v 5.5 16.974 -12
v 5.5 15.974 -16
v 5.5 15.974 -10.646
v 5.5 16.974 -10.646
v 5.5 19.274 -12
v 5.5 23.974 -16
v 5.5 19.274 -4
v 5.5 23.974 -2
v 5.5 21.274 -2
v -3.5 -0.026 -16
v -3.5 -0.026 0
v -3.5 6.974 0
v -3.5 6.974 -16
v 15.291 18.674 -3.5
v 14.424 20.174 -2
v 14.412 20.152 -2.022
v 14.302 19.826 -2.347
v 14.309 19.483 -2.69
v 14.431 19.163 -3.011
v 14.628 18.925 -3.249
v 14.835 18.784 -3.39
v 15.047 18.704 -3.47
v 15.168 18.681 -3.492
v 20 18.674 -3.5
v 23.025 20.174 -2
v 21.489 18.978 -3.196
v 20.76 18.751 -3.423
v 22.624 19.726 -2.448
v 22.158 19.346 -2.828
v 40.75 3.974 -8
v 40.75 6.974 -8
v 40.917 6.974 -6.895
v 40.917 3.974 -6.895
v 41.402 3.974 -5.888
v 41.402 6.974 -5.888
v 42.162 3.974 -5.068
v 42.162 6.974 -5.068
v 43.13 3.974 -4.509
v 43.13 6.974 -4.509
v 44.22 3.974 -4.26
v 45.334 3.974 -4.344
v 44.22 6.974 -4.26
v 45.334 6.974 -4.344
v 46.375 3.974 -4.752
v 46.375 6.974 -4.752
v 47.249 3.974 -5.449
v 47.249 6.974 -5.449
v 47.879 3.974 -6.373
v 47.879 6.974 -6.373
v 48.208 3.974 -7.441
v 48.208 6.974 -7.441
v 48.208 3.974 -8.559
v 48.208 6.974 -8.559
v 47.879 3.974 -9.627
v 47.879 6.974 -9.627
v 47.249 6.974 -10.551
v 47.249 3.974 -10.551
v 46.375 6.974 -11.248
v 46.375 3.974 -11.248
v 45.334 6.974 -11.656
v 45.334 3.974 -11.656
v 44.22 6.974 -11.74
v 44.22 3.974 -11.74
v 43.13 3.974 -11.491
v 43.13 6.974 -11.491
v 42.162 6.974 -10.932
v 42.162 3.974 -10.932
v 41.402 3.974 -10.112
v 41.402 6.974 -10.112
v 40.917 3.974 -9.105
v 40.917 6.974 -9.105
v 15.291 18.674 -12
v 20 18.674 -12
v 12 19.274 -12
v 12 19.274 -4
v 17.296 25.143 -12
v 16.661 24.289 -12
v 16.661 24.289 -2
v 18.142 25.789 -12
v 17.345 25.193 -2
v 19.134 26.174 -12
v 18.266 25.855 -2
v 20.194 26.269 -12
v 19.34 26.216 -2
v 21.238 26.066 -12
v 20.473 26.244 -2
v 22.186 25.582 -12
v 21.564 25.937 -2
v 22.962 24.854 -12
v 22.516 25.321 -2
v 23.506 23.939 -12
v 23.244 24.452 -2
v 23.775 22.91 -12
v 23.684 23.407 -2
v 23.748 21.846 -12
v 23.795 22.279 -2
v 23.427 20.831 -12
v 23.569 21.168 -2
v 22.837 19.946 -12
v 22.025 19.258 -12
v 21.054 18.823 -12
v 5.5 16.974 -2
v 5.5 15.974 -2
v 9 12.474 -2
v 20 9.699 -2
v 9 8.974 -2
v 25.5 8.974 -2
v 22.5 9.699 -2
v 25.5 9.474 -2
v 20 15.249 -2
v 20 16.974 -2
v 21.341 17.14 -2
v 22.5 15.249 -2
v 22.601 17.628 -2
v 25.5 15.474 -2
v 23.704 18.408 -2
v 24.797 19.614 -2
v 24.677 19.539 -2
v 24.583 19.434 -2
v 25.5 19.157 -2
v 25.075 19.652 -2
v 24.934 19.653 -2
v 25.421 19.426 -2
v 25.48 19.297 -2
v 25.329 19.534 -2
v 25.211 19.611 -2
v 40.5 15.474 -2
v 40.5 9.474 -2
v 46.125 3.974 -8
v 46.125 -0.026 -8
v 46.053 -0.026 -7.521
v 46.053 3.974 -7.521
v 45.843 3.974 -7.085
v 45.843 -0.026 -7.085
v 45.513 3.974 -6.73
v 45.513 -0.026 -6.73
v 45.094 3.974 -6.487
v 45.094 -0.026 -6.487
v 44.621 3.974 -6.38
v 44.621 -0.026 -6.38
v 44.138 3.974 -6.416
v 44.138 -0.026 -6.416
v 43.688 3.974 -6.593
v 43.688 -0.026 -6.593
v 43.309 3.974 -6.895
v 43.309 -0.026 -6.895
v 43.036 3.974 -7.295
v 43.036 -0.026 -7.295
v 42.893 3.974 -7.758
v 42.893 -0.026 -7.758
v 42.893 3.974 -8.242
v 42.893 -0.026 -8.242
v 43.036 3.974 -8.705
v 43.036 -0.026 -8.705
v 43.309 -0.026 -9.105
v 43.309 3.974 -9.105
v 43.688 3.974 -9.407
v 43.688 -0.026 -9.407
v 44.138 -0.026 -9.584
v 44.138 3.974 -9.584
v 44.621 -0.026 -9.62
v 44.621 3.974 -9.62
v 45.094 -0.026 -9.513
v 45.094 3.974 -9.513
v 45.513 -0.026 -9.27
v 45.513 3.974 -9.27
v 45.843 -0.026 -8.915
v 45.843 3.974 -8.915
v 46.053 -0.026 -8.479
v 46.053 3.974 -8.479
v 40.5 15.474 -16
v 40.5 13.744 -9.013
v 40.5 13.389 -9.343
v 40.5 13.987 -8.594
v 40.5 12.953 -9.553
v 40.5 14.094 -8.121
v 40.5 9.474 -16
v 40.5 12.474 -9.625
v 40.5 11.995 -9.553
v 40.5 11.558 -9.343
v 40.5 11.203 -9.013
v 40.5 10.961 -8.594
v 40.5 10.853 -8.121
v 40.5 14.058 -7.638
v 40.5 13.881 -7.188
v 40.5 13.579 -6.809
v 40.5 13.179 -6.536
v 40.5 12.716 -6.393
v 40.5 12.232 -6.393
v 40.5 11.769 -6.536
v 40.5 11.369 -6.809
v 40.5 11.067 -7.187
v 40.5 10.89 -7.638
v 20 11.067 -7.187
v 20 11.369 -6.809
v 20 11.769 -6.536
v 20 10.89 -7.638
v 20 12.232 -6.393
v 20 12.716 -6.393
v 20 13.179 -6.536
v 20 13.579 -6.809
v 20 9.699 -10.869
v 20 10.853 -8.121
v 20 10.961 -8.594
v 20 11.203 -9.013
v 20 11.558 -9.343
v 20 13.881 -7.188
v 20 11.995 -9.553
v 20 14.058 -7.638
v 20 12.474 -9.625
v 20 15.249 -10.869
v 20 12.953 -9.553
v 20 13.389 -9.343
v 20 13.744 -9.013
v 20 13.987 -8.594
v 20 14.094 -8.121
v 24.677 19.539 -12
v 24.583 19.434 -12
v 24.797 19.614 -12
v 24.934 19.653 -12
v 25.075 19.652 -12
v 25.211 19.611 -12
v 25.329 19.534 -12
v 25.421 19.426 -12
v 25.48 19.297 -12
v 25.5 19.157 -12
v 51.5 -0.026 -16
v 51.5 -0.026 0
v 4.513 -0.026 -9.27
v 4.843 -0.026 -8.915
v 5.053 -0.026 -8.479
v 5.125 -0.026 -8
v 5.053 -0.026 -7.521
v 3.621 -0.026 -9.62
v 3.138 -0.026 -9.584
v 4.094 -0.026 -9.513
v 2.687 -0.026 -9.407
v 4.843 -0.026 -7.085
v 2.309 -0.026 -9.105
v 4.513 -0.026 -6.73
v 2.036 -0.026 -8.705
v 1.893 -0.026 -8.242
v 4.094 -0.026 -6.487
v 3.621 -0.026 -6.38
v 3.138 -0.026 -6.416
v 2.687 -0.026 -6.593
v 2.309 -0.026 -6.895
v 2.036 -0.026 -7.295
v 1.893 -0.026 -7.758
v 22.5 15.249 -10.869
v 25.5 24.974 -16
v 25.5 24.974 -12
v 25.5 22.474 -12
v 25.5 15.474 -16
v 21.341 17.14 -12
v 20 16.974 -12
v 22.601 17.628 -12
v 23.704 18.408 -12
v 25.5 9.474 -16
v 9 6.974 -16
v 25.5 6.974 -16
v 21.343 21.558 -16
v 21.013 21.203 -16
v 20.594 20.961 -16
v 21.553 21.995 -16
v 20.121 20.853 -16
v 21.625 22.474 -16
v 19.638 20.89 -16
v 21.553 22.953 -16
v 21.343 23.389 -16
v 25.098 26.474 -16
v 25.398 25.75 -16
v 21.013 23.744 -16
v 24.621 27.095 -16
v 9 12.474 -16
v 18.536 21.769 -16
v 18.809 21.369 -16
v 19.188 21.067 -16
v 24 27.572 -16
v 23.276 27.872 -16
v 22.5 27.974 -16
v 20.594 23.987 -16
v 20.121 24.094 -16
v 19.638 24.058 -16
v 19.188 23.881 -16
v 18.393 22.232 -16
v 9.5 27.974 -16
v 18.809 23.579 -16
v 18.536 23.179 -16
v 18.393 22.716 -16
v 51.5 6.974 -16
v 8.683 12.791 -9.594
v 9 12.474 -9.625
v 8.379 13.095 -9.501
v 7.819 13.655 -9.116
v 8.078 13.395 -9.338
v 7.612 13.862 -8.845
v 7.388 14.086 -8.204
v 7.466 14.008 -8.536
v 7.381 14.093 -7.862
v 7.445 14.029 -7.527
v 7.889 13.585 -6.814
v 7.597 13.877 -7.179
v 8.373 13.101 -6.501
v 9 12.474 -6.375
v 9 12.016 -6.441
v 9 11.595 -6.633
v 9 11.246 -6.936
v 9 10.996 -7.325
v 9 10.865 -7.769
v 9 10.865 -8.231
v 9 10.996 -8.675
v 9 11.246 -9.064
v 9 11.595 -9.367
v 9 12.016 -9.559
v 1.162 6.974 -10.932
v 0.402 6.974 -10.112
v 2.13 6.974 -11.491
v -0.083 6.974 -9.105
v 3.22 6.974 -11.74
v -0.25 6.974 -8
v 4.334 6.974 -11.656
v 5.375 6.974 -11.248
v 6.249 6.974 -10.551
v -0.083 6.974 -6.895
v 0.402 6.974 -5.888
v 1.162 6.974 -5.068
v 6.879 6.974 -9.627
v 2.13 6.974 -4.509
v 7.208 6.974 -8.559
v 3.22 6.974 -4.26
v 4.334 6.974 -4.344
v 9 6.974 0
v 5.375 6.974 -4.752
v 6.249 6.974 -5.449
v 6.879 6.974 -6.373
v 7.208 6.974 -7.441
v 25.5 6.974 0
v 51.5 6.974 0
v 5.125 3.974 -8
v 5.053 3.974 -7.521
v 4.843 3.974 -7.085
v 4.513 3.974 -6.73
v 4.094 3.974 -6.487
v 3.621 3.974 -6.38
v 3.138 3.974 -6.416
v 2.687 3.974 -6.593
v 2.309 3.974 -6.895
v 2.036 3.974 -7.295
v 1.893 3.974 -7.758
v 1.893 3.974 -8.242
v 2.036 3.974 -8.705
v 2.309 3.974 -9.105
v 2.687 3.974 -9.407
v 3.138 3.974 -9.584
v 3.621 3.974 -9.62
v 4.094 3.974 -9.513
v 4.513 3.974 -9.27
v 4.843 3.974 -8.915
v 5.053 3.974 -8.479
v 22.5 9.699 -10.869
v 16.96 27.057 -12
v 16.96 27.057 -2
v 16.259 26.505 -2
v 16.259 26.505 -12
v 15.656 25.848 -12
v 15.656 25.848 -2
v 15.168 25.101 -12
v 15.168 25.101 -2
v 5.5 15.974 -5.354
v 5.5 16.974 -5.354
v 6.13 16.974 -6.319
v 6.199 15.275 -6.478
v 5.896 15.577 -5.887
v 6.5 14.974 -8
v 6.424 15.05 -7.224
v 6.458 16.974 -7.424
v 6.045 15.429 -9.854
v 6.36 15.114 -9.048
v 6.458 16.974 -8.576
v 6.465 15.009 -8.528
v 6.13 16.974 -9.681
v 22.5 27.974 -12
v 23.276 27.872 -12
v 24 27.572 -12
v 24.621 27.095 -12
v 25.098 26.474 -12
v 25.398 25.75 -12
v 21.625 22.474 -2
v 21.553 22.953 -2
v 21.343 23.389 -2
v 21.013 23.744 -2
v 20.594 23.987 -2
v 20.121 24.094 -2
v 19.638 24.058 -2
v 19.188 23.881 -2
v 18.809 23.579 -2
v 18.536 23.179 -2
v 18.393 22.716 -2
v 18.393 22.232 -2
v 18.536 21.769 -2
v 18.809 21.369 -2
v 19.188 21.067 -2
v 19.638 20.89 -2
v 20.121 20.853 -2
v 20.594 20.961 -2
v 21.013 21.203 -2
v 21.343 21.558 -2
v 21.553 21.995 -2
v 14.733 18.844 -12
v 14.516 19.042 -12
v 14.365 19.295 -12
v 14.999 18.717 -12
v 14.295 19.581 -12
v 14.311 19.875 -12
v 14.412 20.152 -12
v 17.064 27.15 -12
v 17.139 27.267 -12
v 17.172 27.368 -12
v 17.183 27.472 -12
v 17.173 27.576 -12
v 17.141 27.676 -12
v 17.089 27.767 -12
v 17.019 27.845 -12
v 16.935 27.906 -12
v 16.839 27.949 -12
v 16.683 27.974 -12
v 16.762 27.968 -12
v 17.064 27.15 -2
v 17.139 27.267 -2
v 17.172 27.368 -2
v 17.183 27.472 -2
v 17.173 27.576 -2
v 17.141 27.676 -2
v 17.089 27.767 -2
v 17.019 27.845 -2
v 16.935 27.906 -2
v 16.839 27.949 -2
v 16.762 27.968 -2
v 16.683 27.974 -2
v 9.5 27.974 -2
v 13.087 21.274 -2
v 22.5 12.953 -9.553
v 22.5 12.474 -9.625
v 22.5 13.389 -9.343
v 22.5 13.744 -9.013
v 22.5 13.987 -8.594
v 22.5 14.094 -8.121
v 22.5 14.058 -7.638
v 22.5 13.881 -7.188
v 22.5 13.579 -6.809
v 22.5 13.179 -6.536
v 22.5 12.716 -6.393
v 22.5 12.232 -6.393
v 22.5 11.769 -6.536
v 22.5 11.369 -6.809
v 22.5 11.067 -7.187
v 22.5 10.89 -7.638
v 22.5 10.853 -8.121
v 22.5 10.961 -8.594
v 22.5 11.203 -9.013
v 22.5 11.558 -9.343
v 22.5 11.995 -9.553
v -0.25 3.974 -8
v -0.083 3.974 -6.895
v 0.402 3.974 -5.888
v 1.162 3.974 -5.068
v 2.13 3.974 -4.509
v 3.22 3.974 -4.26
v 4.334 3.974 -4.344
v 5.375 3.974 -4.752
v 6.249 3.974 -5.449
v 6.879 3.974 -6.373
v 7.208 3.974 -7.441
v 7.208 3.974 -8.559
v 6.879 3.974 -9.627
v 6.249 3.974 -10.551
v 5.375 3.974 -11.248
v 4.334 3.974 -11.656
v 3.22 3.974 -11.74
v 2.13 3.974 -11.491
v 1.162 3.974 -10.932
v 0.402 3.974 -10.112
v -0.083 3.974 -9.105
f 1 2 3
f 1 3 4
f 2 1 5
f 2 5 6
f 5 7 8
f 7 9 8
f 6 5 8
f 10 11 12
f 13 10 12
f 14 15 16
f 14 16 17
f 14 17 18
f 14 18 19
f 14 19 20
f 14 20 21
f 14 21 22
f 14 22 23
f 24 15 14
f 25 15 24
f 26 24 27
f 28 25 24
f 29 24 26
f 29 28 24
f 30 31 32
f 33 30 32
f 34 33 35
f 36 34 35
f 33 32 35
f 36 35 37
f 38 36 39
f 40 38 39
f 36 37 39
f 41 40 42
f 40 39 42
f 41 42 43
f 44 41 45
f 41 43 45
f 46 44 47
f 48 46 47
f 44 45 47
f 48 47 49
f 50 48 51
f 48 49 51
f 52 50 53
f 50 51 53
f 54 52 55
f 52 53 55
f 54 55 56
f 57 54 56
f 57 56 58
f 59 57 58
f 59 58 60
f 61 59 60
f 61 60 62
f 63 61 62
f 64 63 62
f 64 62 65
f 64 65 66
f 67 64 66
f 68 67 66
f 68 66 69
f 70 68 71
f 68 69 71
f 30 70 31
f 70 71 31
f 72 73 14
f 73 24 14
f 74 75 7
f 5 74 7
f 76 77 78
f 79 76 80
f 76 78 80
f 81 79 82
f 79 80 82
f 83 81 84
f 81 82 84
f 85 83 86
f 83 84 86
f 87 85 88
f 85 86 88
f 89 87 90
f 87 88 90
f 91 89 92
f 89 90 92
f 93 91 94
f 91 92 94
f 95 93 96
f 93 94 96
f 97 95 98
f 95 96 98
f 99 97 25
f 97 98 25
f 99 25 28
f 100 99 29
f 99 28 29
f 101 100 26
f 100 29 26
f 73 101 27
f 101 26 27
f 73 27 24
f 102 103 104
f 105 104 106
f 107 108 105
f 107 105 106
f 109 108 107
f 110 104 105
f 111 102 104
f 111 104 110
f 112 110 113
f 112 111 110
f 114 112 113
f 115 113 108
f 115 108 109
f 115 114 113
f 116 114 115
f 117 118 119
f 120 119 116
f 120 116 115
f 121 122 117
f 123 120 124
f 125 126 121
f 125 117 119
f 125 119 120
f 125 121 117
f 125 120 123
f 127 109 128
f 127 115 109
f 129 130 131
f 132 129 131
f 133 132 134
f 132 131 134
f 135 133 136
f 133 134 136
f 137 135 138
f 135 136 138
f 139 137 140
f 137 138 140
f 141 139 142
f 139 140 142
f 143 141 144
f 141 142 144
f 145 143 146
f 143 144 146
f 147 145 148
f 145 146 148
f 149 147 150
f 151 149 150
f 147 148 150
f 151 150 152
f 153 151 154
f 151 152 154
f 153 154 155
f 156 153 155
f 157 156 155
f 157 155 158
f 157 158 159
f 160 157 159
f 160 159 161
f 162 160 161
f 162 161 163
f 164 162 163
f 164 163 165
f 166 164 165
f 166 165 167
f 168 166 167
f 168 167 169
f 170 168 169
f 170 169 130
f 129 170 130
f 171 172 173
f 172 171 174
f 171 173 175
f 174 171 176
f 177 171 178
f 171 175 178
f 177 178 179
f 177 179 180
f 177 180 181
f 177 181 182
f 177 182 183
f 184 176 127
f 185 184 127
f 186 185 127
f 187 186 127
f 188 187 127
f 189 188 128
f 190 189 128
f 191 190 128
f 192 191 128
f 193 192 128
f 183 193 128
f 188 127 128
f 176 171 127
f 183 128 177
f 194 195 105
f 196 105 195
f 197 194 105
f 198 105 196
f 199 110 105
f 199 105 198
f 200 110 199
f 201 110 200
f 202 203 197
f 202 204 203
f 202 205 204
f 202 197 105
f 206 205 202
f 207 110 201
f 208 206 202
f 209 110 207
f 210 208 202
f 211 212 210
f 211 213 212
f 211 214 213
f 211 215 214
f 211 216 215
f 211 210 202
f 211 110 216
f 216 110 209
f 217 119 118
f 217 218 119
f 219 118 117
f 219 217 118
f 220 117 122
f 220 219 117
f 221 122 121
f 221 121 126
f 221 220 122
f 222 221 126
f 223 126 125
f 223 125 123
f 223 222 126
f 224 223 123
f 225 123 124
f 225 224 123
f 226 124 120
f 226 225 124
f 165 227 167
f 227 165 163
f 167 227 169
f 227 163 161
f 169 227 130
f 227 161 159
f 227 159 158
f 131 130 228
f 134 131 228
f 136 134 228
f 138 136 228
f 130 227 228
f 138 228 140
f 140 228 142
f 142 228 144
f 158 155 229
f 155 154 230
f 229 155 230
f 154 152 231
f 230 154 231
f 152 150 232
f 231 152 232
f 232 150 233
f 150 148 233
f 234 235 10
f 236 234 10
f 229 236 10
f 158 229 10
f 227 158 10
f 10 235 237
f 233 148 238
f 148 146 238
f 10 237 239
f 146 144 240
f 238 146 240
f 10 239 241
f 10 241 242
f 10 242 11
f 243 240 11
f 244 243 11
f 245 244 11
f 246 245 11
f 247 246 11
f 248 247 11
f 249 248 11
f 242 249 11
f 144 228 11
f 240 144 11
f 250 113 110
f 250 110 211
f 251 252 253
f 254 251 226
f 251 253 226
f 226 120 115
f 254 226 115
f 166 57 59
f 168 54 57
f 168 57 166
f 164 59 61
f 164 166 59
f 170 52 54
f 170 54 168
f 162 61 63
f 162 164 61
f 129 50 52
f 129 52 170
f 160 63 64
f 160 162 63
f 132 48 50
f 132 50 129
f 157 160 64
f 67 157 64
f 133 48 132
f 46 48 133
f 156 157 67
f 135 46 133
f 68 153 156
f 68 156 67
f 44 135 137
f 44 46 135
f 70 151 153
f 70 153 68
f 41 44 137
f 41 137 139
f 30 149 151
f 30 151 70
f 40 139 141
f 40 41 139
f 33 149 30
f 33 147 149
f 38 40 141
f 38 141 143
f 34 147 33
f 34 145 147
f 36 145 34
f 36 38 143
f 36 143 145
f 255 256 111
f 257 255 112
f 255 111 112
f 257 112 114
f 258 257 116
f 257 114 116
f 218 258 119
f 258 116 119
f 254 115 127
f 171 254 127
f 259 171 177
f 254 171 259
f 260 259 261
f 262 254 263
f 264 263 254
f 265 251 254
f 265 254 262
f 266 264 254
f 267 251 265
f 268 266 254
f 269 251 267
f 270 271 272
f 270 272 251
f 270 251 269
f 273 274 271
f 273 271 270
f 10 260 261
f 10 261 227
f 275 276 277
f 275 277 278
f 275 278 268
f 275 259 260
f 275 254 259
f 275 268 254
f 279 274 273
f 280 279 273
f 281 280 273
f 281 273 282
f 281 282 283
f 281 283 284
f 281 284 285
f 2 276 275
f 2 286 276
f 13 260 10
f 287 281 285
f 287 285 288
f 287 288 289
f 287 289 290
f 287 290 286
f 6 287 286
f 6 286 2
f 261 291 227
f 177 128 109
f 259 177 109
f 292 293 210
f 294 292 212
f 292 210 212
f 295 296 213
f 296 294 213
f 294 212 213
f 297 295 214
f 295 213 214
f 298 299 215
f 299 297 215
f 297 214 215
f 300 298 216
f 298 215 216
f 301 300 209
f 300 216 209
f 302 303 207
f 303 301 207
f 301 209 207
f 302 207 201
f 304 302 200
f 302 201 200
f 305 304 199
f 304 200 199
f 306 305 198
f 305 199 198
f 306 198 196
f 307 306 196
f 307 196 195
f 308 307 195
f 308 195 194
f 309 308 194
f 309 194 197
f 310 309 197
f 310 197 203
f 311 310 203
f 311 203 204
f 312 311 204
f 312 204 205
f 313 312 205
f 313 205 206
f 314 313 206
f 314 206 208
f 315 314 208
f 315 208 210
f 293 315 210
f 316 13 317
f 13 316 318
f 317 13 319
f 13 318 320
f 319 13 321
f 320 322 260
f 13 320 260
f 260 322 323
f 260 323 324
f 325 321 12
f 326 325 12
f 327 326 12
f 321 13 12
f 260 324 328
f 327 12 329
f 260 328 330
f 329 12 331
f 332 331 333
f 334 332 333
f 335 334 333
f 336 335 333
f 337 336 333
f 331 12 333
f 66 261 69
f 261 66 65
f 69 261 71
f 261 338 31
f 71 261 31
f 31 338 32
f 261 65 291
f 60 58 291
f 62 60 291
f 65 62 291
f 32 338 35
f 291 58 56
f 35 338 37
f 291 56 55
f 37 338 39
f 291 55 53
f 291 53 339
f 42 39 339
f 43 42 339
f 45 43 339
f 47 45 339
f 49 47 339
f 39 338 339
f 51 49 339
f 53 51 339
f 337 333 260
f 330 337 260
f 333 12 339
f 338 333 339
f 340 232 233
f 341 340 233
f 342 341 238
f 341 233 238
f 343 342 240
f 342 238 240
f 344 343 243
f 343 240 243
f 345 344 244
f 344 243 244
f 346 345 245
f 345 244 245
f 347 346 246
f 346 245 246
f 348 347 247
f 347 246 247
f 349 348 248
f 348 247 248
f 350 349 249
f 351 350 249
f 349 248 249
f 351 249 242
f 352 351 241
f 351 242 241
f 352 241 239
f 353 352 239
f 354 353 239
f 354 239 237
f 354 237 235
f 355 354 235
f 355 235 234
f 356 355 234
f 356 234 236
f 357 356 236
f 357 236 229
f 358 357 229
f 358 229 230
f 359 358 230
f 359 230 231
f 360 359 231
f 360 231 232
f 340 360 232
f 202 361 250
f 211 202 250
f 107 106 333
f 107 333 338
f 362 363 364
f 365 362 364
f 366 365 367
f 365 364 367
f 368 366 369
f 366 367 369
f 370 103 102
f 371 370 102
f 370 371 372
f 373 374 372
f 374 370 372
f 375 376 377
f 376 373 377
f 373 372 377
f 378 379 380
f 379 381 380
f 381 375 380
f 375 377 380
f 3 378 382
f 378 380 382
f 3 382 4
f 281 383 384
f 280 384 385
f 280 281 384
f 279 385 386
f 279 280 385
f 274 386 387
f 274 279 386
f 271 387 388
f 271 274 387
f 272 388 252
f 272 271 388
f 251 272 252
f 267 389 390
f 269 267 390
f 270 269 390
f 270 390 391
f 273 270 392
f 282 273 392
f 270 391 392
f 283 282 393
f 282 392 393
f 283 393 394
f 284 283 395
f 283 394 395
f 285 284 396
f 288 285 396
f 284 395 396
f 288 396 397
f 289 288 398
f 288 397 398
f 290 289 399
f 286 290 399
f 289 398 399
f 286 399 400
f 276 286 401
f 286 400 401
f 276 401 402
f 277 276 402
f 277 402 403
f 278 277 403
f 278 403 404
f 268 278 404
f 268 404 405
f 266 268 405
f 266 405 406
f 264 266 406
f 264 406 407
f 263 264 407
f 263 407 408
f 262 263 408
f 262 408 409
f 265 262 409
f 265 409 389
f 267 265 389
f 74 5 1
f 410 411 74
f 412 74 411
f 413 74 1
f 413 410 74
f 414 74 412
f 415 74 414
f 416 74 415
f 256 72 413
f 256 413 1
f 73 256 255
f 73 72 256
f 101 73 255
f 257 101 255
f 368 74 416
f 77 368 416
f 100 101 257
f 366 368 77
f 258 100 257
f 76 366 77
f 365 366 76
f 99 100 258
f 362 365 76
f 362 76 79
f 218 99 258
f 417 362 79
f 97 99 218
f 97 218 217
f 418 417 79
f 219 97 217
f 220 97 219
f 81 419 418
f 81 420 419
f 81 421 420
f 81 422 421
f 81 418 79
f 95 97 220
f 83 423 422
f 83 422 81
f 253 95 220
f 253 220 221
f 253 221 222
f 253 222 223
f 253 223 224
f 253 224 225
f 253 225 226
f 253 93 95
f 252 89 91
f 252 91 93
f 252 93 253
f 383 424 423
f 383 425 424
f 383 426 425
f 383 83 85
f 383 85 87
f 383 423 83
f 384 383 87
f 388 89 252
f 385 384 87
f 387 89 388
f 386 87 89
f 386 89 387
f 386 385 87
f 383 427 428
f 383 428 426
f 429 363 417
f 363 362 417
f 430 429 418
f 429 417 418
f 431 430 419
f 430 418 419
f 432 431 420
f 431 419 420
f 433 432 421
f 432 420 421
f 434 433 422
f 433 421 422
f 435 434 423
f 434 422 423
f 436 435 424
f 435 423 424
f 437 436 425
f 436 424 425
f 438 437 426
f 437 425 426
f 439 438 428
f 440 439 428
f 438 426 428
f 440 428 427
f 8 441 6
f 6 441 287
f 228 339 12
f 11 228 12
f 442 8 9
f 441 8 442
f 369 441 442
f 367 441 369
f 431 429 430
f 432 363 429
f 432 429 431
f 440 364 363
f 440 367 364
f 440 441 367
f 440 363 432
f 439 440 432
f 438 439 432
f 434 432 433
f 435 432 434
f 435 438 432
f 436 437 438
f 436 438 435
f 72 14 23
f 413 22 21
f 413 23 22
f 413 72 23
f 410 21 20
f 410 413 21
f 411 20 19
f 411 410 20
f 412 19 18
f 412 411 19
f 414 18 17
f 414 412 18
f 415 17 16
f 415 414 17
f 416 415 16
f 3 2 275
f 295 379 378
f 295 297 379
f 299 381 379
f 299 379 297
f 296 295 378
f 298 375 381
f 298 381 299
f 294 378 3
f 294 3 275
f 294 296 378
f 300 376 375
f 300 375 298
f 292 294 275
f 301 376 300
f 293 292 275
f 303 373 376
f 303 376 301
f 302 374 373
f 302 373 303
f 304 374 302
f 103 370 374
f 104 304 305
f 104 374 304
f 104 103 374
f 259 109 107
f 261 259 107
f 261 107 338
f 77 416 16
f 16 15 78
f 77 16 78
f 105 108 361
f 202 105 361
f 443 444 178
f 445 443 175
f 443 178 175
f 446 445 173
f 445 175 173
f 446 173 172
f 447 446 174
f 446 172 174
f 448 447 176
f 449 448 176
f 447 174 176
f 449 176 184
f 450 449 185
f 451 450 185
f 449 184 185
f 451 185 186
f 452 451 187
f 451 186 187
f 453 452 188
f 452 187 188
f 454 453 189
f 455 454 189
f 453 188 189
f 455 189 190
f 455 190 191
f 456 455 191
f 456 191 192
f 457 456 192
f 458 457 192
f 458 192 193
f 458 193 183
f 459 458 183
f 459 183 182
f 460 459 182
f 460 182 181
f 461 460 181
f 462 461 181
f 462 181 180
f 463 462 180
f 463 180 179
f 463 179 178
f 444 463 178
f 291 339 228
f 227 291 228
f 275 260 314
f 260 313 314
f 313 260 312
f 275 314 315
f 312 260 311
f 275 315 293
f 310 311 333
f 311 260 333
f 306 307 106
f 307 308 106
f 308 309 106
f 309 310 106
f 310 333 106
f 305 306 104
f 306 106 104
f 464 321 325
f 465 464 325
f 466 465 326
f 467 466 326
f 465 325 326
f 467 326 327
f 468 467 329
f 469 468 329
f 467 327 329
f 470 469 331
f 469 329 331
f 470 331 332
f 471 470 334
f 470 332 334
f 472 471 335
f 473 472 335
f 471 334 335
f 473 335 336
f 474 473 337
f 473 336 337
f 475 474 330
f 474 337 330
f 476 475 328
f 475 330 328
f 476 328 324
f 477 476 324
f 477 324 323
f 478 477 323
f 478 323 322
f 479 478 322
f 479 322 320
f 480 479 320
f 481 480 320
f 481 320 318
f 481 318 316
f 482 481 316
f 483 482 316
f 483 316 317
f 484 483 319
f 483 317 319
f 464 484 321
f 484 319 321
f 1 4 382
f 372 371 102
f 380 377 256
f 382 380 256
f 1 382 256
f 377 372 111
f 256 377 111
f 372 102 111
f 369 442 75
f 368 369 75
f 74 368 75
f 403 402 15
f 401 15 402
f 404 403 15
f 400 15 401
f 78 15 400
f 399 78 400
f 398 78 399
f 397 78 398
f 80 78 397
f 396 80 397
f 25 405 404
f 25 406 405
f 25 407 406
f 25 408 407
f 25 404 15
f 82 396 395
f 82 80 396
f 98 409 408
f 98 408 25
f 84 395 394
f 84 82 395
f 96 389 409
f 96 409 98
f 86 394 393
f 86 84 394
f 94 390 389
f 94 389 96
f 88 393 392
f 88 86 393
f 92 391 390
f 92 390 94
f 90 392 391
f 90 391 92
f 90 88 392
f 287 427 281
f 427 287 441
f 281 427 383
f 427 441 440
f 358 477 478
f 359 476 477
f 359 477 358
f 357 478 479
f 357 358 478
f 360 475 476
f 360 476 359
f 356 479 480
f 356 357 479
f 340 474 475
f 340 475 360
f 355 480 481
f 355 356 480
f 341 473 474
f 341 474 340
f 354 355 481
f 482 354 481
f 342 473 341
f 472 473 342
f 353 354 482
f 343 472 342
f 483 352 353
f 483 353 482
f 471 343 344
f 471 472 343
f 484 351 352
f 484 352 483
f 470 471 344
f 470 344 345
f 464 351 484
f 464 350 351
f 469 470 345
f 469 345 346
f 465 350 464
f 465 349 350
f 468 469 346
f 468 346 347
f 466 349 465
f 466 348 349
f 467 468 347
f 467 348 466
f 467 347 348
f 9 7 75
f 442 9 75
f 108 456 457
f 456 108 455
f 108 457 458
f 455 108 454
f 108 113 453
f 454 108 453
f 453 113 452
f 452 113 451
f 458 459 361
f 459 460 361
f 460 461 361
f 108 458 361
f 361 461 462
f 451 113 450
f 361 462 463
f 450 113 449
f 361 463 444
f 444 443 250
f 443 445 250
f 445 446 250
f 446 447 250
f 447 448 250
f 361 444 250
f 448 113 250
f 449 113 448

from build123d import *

# Parameters (mm, degrees)
BOSS_EXTRUDE1_DEPTH = 16
CUT_EXTRUDE1_START  = 2
CUT_EXTRUDE1_DEPTH  = 14
SKETCH7_R           = 1.625
CUT_EXTRUDE2_DEPTH  = 55.539321396
CUT_EXTRUDE3_START  = -18
SKETCH8_W           = 10.868969255
SKETCH8_H           = 5.55
CUT_EXTRUDE3_DEPTH  = 2.5
SKETCH9_R           = 1.625
CUT_EXTRUDE4_DEPTH  = 8
SKETCH16_R          = 3.75
CUT_EXTRUDE9_DEPTH  = 3
SKETCH21_W          = 35
SKETCH21_H          = 21
CUT_EXTRUDE13_DEPTH = 2
FILLET2_R           = 0.5
FILLET3_R           = 3
FILLET4_R           = 1
CHAMFER3_SIZE       = 3.5
CHAMFER4_SIZE       = 4
SKETCH18_R          = 1.625
CUT_EXTRUDE11_DEPTH = 20
SKETCH19_R          = 4
CUT_EXTRUDE12_DEPTH = 5
CHAMFER9_SIZE       = 2
CHAMFER12_SIZE      = 1.5
CHAMFER11_SIZE      = 2


# Some blends are built 0.0001 mm under size
with BuildPart() as part:
    # Sketch4 → Boss-Extrude1 (new body)
    with BuildSketch(Plane.XY):
        Polygon((-3.5, -0.026126862), (-3.5, 6.973873138), (9, 6.973873138), (9, 12.473873138), (5.5, 12.473873138), (5.5, 27.973873138), (25.5, 27.973873138), (25.5, 15.473873138), (40.5, 15.473873138), (40.5, 9.473873138), (25.5, 9.473873138), (25.5, 6.973873138), (51.5, 6.973873138), (51.5, -0.026126862), align=None)
    extrude(amount=-BOSS_EXTRUDE1_DEPTH)

    # Sketch6 → Cut-Extrude1 (cut)
    with BuildSketch(Plane.XY.offset(CUT_EXTRUDE1_START)):
        with BuildLine():
            Line((12, 19.273873138), (5.5, 19.273873138))
            Line((5.5, 19.273873138), (5.5, 16.973873138))
            Line((5.5, 16.973873138), (20, 16.973873138))
            ThreePointArc((20, 16.973873138), (23.888996032, 18.58469458), (25.499999994, 22.473615007))
            Line((25.499999994, 22.473615007), (25.5, 27.973873138))
            Line((25.5, 27.973873138), (20, 27.973873138))
            ThreePointArc((20, 27.973873138), (17.189181506, 27.201377701), (15.167942816, 25.100891099))
            Line((15.167942816, 25.100891099), (12, 19.273873138))
        make_face()
        with BuildLine():
            Line((20, 18.673873138), (13.608794956, 18.673873138))
            Line((13.608794956, 18.673873138), (16.661487764, 24.28890373))
            ThreePointArc((16.661487764, 24.28890373), (23.26627588, 24.415893189), (20, 18.673873138))
        make_face(mode=Mode.SUBTRACT)
    extrude(amount=-CUT_EXTRUDE1_DEPTH, mode=Mode.SUBTRACT)

    # Sketch7 → Cut-Extrude2 (cut, through all)
    with BuildSketch(Plane(origin=(40.5, 0, 0), x_dir=(0, 0, -1), z_dir=(1, 0, 0))):
        with Locations((8, 12.473873138)):
            Circle(SKETCH7_R)
    extrude(amount=-CUT_EXTRUDE2_DEPTH, mode=Mode.SUBTRACT)

    # Sketch8 → Cut-Extrude3 (cut)
    with BuildSketch(Plane(origin=(40.5, 0, 0), x_dir=(0, 0, -1), z_dir=(1, 0, 0)).offset(CUT_EXTRUDE3_START)):
        with Locations((5.434484628, 12.473873138)):
            Rectangle(SKETCH8_W, SKETCH8_H)
    extrude(amount=-CUT_EXTRUDE3_DEPTH, mode=Mode.SUBTRACT)

    # Sketch9 → Cut-Extrude4 (cut)
    with BuildSketch(Plane.XZ.offset(0.026126862)):
        with Locations((3.5, -8)):
            Circle(SKETCH9_R)
        with Locations((44.5, -8)):
            Circle(SKETCH9_R)
    extrude(amount=-CUT_EXTRUDE4_DEPTH, mode=Mode.SUBTRACT)

    # Sketch16 → Cut-Extrude9 (cut)
    with BuildSketch(Plane(origin=(0, 6.973873138, 0), x_dir=(1, 0, 0), z_dir=(0, 1, 0))):
        with Locations(Location((3.5, 8, 0), (0, 0, 180))):
            Circle(SKETCH16_R)
        with Locations(Location((44.5, 8, 0), (0, 0, 180))):
            Circle(SKETCH16_R)
    extrude(amount=-CUT_EXTRUDE9_DEPTH, mode=Mode.SUBTRACT)

    # Sketch21 → Cut-Extrude13 (cut)
    with BuildSketch(Plane.XY):
        with Locations((23, 17.473873138)):
            Rectangle(SKETCH21_W, SKETCH21_H)
    extrude(amount=-CUT_EXTRUDE13_DEPTH, mode=Mode.SUBTRACT)

    # Fillet2
    fillet2_edges = [part.edges().sort_by_distance(p)[0] for p in [
        (20, 27.973873138, -7),
        (25.499999994, 22.473615007, -7),
    ]]
    fillet(fillet2_edges, radius=FILLET2_R)

    # Fillet3
    fillet3_edges = [part.edges().sort_by_distance(p)[0] for p in [
        (25.5, 27.973873138, -14),
    ]]
    fillet(fillet3_edges, radius=FILLET3_R)

    # Fillet4
    fillet4_edges = [part.edges().sort_by_distance(p)[0] for p in [
        (13.608794956, 18.673873138, -7),
    ]]
    fillet(fillet4_edges, radius=FILLET4_R)

    # Chamfer3
    # the kernel refuses this chamfer: 3.5 mm, written as the material it takes off along each edge
    with BuildSketch(Plane(origin=(5.5, 12.473873138, 7.000890458), x_dir=(-0.02749587661058662, 0.9996219169112968, 0), z_dir=(0, 0, -1))) as chamfer3_piece_1_section:
        Polygon((CHAMFER3_SIZE * 0.999621916911, CHAMFER3_SIZE * 0.0274958766106), (-CHAMFER3_SIZE * 0.0274958766106, CHAMFER3_SIZE * 0.999621916911), (0, 0), align=None)
    chamfer3_piece_1 = extrude(amount=22.376780916, mode=Mode.PRIVATE)
    chamfer3_piece_1 = split(chamfer3_piece_1, bisect_by=Plane(origin=(9, 13.630287679, -4.1875), z_dir=(-1, 0, 0)), keep=Keep.TOP, mode=Mode.PRIVATE)
    add(chamfer3_piece_1, mode=Mode.SUBTRACT)
    with BuildSketch(Plane(origin=(5.5, 12.473873138, -0.624109542), x_dir=(-0.02749587661058662, 0.9996219169112968, 0), z_dir=(0, 0, -1))) as chamfer3_piece_2_section:
        Polygon((CHAMFER3_SIZE * 0.999621916911, CHAMFER3_SIZE * 0.0274958766106), (-CHAMFER3_SIZE * 0.0274958766106, CHAMFER3_SIZE * 0.999621916911), (0, 0), align=None)
    chamfer3_piece_2 = extrude(amount=24.376780916, mode=Mode.PRIVATE)
    chamfer3_piece_2 = split(chamfer3_piece_2, bisect_by=Plane(origin=(9, 13.630287679, -12.8125), z_dir=(-1, 0, 0)), keep=Keep.TOP, mode=Mode.PRIVATE)
    add(chamfer3_piece_2, mode=Mode.SUBTRACT)

    # Chamfer4
    chamfer4_edges = [part.edges().sort_by_distance(p)[0] for p in [
        (5.5, 27.973873138, -9),
    ]]
    chamfer(chamfer4_edges, length=CHAMFER4_SIZE)

    # Sketch18 → Cut-Extrude11 (cut)
    with BuildSketch(Plane.XY):
        with Locations((20, 22.473873138)):
            Circle(SKETCH18_R)
    extrude(amount=-CUT_EXTRUDE11_DEPTH, mode=Mode.SUBTRACT)

    # Sketch19 → Cut-Extrude12 (cut)
    with BuildSketch(Plane(origin=(0, 16.973873138, 0), x_dir=(1, 0, 0), z_dir=(0, 1, 0))):
        with Locations((2.5, 8)):
            Circle(SKETCH19_R)
    extrude(amount=-CUT_EXTRUDE12_DEPTH, mode=Mode.SUBTRACT)

    # Chamfer9
    chamfer9_edges = [part.edges().sort_by_distance(p)[0] for p in [
        (17.25, 6.973873138, -2),
    ]]
    chamfer(chamfer9_edges, length=CHAMFER9_SIZE - 0.0001)  # a hair under: the kernel refuses the full size

    # Chamfer12
    # the kernel refuses this chamfer: 1.5 mm, written as the material it takes off along each edge
    with BuildSketch(Plane(origin=(23.857524482, 18.673873138, -2), x_dir=(0, 0.9996219169112968, 0.027495876610586334), z_dir=(-1, 0, 0))) as chamfer12_piece_1_section:
        Polygon((CHAMFER12_SIZE * 0.999621916911, CHAMFER12_SIZE * 0.0274958766106), (-CHAMFER12_SIZE * 0.0274958766106, CHAMFER12_SIZE * 0.999621916911), (0, 0), align=None)
    chamfer12_piece_1 = extrude(amount=12.424357944, mode=Mode.PRIVATE)
    chamfer12_piece_1 = split(chamfer12_piece_1, bisect_by=Plane(origin=(15.45343037, 22.066839589, -2.289421032), z_dir=(0.8785558517032834, -0.47763962925820797, 0)), keep=Keep.TOP, mode=Mode.PRIVATE)
    add(chamfer12_piece_1, mode=Mode.SUBTRACT)

    # Chamfer11
    chamfer11_edges = [part.edges().sort_by_distance(p)[0] for p in [
        (8.75, 19.273873138, -2),
    ]]
    chamfer(chamfer11_edges, length=CHAMFER11_SIZE)


solid = part.part
